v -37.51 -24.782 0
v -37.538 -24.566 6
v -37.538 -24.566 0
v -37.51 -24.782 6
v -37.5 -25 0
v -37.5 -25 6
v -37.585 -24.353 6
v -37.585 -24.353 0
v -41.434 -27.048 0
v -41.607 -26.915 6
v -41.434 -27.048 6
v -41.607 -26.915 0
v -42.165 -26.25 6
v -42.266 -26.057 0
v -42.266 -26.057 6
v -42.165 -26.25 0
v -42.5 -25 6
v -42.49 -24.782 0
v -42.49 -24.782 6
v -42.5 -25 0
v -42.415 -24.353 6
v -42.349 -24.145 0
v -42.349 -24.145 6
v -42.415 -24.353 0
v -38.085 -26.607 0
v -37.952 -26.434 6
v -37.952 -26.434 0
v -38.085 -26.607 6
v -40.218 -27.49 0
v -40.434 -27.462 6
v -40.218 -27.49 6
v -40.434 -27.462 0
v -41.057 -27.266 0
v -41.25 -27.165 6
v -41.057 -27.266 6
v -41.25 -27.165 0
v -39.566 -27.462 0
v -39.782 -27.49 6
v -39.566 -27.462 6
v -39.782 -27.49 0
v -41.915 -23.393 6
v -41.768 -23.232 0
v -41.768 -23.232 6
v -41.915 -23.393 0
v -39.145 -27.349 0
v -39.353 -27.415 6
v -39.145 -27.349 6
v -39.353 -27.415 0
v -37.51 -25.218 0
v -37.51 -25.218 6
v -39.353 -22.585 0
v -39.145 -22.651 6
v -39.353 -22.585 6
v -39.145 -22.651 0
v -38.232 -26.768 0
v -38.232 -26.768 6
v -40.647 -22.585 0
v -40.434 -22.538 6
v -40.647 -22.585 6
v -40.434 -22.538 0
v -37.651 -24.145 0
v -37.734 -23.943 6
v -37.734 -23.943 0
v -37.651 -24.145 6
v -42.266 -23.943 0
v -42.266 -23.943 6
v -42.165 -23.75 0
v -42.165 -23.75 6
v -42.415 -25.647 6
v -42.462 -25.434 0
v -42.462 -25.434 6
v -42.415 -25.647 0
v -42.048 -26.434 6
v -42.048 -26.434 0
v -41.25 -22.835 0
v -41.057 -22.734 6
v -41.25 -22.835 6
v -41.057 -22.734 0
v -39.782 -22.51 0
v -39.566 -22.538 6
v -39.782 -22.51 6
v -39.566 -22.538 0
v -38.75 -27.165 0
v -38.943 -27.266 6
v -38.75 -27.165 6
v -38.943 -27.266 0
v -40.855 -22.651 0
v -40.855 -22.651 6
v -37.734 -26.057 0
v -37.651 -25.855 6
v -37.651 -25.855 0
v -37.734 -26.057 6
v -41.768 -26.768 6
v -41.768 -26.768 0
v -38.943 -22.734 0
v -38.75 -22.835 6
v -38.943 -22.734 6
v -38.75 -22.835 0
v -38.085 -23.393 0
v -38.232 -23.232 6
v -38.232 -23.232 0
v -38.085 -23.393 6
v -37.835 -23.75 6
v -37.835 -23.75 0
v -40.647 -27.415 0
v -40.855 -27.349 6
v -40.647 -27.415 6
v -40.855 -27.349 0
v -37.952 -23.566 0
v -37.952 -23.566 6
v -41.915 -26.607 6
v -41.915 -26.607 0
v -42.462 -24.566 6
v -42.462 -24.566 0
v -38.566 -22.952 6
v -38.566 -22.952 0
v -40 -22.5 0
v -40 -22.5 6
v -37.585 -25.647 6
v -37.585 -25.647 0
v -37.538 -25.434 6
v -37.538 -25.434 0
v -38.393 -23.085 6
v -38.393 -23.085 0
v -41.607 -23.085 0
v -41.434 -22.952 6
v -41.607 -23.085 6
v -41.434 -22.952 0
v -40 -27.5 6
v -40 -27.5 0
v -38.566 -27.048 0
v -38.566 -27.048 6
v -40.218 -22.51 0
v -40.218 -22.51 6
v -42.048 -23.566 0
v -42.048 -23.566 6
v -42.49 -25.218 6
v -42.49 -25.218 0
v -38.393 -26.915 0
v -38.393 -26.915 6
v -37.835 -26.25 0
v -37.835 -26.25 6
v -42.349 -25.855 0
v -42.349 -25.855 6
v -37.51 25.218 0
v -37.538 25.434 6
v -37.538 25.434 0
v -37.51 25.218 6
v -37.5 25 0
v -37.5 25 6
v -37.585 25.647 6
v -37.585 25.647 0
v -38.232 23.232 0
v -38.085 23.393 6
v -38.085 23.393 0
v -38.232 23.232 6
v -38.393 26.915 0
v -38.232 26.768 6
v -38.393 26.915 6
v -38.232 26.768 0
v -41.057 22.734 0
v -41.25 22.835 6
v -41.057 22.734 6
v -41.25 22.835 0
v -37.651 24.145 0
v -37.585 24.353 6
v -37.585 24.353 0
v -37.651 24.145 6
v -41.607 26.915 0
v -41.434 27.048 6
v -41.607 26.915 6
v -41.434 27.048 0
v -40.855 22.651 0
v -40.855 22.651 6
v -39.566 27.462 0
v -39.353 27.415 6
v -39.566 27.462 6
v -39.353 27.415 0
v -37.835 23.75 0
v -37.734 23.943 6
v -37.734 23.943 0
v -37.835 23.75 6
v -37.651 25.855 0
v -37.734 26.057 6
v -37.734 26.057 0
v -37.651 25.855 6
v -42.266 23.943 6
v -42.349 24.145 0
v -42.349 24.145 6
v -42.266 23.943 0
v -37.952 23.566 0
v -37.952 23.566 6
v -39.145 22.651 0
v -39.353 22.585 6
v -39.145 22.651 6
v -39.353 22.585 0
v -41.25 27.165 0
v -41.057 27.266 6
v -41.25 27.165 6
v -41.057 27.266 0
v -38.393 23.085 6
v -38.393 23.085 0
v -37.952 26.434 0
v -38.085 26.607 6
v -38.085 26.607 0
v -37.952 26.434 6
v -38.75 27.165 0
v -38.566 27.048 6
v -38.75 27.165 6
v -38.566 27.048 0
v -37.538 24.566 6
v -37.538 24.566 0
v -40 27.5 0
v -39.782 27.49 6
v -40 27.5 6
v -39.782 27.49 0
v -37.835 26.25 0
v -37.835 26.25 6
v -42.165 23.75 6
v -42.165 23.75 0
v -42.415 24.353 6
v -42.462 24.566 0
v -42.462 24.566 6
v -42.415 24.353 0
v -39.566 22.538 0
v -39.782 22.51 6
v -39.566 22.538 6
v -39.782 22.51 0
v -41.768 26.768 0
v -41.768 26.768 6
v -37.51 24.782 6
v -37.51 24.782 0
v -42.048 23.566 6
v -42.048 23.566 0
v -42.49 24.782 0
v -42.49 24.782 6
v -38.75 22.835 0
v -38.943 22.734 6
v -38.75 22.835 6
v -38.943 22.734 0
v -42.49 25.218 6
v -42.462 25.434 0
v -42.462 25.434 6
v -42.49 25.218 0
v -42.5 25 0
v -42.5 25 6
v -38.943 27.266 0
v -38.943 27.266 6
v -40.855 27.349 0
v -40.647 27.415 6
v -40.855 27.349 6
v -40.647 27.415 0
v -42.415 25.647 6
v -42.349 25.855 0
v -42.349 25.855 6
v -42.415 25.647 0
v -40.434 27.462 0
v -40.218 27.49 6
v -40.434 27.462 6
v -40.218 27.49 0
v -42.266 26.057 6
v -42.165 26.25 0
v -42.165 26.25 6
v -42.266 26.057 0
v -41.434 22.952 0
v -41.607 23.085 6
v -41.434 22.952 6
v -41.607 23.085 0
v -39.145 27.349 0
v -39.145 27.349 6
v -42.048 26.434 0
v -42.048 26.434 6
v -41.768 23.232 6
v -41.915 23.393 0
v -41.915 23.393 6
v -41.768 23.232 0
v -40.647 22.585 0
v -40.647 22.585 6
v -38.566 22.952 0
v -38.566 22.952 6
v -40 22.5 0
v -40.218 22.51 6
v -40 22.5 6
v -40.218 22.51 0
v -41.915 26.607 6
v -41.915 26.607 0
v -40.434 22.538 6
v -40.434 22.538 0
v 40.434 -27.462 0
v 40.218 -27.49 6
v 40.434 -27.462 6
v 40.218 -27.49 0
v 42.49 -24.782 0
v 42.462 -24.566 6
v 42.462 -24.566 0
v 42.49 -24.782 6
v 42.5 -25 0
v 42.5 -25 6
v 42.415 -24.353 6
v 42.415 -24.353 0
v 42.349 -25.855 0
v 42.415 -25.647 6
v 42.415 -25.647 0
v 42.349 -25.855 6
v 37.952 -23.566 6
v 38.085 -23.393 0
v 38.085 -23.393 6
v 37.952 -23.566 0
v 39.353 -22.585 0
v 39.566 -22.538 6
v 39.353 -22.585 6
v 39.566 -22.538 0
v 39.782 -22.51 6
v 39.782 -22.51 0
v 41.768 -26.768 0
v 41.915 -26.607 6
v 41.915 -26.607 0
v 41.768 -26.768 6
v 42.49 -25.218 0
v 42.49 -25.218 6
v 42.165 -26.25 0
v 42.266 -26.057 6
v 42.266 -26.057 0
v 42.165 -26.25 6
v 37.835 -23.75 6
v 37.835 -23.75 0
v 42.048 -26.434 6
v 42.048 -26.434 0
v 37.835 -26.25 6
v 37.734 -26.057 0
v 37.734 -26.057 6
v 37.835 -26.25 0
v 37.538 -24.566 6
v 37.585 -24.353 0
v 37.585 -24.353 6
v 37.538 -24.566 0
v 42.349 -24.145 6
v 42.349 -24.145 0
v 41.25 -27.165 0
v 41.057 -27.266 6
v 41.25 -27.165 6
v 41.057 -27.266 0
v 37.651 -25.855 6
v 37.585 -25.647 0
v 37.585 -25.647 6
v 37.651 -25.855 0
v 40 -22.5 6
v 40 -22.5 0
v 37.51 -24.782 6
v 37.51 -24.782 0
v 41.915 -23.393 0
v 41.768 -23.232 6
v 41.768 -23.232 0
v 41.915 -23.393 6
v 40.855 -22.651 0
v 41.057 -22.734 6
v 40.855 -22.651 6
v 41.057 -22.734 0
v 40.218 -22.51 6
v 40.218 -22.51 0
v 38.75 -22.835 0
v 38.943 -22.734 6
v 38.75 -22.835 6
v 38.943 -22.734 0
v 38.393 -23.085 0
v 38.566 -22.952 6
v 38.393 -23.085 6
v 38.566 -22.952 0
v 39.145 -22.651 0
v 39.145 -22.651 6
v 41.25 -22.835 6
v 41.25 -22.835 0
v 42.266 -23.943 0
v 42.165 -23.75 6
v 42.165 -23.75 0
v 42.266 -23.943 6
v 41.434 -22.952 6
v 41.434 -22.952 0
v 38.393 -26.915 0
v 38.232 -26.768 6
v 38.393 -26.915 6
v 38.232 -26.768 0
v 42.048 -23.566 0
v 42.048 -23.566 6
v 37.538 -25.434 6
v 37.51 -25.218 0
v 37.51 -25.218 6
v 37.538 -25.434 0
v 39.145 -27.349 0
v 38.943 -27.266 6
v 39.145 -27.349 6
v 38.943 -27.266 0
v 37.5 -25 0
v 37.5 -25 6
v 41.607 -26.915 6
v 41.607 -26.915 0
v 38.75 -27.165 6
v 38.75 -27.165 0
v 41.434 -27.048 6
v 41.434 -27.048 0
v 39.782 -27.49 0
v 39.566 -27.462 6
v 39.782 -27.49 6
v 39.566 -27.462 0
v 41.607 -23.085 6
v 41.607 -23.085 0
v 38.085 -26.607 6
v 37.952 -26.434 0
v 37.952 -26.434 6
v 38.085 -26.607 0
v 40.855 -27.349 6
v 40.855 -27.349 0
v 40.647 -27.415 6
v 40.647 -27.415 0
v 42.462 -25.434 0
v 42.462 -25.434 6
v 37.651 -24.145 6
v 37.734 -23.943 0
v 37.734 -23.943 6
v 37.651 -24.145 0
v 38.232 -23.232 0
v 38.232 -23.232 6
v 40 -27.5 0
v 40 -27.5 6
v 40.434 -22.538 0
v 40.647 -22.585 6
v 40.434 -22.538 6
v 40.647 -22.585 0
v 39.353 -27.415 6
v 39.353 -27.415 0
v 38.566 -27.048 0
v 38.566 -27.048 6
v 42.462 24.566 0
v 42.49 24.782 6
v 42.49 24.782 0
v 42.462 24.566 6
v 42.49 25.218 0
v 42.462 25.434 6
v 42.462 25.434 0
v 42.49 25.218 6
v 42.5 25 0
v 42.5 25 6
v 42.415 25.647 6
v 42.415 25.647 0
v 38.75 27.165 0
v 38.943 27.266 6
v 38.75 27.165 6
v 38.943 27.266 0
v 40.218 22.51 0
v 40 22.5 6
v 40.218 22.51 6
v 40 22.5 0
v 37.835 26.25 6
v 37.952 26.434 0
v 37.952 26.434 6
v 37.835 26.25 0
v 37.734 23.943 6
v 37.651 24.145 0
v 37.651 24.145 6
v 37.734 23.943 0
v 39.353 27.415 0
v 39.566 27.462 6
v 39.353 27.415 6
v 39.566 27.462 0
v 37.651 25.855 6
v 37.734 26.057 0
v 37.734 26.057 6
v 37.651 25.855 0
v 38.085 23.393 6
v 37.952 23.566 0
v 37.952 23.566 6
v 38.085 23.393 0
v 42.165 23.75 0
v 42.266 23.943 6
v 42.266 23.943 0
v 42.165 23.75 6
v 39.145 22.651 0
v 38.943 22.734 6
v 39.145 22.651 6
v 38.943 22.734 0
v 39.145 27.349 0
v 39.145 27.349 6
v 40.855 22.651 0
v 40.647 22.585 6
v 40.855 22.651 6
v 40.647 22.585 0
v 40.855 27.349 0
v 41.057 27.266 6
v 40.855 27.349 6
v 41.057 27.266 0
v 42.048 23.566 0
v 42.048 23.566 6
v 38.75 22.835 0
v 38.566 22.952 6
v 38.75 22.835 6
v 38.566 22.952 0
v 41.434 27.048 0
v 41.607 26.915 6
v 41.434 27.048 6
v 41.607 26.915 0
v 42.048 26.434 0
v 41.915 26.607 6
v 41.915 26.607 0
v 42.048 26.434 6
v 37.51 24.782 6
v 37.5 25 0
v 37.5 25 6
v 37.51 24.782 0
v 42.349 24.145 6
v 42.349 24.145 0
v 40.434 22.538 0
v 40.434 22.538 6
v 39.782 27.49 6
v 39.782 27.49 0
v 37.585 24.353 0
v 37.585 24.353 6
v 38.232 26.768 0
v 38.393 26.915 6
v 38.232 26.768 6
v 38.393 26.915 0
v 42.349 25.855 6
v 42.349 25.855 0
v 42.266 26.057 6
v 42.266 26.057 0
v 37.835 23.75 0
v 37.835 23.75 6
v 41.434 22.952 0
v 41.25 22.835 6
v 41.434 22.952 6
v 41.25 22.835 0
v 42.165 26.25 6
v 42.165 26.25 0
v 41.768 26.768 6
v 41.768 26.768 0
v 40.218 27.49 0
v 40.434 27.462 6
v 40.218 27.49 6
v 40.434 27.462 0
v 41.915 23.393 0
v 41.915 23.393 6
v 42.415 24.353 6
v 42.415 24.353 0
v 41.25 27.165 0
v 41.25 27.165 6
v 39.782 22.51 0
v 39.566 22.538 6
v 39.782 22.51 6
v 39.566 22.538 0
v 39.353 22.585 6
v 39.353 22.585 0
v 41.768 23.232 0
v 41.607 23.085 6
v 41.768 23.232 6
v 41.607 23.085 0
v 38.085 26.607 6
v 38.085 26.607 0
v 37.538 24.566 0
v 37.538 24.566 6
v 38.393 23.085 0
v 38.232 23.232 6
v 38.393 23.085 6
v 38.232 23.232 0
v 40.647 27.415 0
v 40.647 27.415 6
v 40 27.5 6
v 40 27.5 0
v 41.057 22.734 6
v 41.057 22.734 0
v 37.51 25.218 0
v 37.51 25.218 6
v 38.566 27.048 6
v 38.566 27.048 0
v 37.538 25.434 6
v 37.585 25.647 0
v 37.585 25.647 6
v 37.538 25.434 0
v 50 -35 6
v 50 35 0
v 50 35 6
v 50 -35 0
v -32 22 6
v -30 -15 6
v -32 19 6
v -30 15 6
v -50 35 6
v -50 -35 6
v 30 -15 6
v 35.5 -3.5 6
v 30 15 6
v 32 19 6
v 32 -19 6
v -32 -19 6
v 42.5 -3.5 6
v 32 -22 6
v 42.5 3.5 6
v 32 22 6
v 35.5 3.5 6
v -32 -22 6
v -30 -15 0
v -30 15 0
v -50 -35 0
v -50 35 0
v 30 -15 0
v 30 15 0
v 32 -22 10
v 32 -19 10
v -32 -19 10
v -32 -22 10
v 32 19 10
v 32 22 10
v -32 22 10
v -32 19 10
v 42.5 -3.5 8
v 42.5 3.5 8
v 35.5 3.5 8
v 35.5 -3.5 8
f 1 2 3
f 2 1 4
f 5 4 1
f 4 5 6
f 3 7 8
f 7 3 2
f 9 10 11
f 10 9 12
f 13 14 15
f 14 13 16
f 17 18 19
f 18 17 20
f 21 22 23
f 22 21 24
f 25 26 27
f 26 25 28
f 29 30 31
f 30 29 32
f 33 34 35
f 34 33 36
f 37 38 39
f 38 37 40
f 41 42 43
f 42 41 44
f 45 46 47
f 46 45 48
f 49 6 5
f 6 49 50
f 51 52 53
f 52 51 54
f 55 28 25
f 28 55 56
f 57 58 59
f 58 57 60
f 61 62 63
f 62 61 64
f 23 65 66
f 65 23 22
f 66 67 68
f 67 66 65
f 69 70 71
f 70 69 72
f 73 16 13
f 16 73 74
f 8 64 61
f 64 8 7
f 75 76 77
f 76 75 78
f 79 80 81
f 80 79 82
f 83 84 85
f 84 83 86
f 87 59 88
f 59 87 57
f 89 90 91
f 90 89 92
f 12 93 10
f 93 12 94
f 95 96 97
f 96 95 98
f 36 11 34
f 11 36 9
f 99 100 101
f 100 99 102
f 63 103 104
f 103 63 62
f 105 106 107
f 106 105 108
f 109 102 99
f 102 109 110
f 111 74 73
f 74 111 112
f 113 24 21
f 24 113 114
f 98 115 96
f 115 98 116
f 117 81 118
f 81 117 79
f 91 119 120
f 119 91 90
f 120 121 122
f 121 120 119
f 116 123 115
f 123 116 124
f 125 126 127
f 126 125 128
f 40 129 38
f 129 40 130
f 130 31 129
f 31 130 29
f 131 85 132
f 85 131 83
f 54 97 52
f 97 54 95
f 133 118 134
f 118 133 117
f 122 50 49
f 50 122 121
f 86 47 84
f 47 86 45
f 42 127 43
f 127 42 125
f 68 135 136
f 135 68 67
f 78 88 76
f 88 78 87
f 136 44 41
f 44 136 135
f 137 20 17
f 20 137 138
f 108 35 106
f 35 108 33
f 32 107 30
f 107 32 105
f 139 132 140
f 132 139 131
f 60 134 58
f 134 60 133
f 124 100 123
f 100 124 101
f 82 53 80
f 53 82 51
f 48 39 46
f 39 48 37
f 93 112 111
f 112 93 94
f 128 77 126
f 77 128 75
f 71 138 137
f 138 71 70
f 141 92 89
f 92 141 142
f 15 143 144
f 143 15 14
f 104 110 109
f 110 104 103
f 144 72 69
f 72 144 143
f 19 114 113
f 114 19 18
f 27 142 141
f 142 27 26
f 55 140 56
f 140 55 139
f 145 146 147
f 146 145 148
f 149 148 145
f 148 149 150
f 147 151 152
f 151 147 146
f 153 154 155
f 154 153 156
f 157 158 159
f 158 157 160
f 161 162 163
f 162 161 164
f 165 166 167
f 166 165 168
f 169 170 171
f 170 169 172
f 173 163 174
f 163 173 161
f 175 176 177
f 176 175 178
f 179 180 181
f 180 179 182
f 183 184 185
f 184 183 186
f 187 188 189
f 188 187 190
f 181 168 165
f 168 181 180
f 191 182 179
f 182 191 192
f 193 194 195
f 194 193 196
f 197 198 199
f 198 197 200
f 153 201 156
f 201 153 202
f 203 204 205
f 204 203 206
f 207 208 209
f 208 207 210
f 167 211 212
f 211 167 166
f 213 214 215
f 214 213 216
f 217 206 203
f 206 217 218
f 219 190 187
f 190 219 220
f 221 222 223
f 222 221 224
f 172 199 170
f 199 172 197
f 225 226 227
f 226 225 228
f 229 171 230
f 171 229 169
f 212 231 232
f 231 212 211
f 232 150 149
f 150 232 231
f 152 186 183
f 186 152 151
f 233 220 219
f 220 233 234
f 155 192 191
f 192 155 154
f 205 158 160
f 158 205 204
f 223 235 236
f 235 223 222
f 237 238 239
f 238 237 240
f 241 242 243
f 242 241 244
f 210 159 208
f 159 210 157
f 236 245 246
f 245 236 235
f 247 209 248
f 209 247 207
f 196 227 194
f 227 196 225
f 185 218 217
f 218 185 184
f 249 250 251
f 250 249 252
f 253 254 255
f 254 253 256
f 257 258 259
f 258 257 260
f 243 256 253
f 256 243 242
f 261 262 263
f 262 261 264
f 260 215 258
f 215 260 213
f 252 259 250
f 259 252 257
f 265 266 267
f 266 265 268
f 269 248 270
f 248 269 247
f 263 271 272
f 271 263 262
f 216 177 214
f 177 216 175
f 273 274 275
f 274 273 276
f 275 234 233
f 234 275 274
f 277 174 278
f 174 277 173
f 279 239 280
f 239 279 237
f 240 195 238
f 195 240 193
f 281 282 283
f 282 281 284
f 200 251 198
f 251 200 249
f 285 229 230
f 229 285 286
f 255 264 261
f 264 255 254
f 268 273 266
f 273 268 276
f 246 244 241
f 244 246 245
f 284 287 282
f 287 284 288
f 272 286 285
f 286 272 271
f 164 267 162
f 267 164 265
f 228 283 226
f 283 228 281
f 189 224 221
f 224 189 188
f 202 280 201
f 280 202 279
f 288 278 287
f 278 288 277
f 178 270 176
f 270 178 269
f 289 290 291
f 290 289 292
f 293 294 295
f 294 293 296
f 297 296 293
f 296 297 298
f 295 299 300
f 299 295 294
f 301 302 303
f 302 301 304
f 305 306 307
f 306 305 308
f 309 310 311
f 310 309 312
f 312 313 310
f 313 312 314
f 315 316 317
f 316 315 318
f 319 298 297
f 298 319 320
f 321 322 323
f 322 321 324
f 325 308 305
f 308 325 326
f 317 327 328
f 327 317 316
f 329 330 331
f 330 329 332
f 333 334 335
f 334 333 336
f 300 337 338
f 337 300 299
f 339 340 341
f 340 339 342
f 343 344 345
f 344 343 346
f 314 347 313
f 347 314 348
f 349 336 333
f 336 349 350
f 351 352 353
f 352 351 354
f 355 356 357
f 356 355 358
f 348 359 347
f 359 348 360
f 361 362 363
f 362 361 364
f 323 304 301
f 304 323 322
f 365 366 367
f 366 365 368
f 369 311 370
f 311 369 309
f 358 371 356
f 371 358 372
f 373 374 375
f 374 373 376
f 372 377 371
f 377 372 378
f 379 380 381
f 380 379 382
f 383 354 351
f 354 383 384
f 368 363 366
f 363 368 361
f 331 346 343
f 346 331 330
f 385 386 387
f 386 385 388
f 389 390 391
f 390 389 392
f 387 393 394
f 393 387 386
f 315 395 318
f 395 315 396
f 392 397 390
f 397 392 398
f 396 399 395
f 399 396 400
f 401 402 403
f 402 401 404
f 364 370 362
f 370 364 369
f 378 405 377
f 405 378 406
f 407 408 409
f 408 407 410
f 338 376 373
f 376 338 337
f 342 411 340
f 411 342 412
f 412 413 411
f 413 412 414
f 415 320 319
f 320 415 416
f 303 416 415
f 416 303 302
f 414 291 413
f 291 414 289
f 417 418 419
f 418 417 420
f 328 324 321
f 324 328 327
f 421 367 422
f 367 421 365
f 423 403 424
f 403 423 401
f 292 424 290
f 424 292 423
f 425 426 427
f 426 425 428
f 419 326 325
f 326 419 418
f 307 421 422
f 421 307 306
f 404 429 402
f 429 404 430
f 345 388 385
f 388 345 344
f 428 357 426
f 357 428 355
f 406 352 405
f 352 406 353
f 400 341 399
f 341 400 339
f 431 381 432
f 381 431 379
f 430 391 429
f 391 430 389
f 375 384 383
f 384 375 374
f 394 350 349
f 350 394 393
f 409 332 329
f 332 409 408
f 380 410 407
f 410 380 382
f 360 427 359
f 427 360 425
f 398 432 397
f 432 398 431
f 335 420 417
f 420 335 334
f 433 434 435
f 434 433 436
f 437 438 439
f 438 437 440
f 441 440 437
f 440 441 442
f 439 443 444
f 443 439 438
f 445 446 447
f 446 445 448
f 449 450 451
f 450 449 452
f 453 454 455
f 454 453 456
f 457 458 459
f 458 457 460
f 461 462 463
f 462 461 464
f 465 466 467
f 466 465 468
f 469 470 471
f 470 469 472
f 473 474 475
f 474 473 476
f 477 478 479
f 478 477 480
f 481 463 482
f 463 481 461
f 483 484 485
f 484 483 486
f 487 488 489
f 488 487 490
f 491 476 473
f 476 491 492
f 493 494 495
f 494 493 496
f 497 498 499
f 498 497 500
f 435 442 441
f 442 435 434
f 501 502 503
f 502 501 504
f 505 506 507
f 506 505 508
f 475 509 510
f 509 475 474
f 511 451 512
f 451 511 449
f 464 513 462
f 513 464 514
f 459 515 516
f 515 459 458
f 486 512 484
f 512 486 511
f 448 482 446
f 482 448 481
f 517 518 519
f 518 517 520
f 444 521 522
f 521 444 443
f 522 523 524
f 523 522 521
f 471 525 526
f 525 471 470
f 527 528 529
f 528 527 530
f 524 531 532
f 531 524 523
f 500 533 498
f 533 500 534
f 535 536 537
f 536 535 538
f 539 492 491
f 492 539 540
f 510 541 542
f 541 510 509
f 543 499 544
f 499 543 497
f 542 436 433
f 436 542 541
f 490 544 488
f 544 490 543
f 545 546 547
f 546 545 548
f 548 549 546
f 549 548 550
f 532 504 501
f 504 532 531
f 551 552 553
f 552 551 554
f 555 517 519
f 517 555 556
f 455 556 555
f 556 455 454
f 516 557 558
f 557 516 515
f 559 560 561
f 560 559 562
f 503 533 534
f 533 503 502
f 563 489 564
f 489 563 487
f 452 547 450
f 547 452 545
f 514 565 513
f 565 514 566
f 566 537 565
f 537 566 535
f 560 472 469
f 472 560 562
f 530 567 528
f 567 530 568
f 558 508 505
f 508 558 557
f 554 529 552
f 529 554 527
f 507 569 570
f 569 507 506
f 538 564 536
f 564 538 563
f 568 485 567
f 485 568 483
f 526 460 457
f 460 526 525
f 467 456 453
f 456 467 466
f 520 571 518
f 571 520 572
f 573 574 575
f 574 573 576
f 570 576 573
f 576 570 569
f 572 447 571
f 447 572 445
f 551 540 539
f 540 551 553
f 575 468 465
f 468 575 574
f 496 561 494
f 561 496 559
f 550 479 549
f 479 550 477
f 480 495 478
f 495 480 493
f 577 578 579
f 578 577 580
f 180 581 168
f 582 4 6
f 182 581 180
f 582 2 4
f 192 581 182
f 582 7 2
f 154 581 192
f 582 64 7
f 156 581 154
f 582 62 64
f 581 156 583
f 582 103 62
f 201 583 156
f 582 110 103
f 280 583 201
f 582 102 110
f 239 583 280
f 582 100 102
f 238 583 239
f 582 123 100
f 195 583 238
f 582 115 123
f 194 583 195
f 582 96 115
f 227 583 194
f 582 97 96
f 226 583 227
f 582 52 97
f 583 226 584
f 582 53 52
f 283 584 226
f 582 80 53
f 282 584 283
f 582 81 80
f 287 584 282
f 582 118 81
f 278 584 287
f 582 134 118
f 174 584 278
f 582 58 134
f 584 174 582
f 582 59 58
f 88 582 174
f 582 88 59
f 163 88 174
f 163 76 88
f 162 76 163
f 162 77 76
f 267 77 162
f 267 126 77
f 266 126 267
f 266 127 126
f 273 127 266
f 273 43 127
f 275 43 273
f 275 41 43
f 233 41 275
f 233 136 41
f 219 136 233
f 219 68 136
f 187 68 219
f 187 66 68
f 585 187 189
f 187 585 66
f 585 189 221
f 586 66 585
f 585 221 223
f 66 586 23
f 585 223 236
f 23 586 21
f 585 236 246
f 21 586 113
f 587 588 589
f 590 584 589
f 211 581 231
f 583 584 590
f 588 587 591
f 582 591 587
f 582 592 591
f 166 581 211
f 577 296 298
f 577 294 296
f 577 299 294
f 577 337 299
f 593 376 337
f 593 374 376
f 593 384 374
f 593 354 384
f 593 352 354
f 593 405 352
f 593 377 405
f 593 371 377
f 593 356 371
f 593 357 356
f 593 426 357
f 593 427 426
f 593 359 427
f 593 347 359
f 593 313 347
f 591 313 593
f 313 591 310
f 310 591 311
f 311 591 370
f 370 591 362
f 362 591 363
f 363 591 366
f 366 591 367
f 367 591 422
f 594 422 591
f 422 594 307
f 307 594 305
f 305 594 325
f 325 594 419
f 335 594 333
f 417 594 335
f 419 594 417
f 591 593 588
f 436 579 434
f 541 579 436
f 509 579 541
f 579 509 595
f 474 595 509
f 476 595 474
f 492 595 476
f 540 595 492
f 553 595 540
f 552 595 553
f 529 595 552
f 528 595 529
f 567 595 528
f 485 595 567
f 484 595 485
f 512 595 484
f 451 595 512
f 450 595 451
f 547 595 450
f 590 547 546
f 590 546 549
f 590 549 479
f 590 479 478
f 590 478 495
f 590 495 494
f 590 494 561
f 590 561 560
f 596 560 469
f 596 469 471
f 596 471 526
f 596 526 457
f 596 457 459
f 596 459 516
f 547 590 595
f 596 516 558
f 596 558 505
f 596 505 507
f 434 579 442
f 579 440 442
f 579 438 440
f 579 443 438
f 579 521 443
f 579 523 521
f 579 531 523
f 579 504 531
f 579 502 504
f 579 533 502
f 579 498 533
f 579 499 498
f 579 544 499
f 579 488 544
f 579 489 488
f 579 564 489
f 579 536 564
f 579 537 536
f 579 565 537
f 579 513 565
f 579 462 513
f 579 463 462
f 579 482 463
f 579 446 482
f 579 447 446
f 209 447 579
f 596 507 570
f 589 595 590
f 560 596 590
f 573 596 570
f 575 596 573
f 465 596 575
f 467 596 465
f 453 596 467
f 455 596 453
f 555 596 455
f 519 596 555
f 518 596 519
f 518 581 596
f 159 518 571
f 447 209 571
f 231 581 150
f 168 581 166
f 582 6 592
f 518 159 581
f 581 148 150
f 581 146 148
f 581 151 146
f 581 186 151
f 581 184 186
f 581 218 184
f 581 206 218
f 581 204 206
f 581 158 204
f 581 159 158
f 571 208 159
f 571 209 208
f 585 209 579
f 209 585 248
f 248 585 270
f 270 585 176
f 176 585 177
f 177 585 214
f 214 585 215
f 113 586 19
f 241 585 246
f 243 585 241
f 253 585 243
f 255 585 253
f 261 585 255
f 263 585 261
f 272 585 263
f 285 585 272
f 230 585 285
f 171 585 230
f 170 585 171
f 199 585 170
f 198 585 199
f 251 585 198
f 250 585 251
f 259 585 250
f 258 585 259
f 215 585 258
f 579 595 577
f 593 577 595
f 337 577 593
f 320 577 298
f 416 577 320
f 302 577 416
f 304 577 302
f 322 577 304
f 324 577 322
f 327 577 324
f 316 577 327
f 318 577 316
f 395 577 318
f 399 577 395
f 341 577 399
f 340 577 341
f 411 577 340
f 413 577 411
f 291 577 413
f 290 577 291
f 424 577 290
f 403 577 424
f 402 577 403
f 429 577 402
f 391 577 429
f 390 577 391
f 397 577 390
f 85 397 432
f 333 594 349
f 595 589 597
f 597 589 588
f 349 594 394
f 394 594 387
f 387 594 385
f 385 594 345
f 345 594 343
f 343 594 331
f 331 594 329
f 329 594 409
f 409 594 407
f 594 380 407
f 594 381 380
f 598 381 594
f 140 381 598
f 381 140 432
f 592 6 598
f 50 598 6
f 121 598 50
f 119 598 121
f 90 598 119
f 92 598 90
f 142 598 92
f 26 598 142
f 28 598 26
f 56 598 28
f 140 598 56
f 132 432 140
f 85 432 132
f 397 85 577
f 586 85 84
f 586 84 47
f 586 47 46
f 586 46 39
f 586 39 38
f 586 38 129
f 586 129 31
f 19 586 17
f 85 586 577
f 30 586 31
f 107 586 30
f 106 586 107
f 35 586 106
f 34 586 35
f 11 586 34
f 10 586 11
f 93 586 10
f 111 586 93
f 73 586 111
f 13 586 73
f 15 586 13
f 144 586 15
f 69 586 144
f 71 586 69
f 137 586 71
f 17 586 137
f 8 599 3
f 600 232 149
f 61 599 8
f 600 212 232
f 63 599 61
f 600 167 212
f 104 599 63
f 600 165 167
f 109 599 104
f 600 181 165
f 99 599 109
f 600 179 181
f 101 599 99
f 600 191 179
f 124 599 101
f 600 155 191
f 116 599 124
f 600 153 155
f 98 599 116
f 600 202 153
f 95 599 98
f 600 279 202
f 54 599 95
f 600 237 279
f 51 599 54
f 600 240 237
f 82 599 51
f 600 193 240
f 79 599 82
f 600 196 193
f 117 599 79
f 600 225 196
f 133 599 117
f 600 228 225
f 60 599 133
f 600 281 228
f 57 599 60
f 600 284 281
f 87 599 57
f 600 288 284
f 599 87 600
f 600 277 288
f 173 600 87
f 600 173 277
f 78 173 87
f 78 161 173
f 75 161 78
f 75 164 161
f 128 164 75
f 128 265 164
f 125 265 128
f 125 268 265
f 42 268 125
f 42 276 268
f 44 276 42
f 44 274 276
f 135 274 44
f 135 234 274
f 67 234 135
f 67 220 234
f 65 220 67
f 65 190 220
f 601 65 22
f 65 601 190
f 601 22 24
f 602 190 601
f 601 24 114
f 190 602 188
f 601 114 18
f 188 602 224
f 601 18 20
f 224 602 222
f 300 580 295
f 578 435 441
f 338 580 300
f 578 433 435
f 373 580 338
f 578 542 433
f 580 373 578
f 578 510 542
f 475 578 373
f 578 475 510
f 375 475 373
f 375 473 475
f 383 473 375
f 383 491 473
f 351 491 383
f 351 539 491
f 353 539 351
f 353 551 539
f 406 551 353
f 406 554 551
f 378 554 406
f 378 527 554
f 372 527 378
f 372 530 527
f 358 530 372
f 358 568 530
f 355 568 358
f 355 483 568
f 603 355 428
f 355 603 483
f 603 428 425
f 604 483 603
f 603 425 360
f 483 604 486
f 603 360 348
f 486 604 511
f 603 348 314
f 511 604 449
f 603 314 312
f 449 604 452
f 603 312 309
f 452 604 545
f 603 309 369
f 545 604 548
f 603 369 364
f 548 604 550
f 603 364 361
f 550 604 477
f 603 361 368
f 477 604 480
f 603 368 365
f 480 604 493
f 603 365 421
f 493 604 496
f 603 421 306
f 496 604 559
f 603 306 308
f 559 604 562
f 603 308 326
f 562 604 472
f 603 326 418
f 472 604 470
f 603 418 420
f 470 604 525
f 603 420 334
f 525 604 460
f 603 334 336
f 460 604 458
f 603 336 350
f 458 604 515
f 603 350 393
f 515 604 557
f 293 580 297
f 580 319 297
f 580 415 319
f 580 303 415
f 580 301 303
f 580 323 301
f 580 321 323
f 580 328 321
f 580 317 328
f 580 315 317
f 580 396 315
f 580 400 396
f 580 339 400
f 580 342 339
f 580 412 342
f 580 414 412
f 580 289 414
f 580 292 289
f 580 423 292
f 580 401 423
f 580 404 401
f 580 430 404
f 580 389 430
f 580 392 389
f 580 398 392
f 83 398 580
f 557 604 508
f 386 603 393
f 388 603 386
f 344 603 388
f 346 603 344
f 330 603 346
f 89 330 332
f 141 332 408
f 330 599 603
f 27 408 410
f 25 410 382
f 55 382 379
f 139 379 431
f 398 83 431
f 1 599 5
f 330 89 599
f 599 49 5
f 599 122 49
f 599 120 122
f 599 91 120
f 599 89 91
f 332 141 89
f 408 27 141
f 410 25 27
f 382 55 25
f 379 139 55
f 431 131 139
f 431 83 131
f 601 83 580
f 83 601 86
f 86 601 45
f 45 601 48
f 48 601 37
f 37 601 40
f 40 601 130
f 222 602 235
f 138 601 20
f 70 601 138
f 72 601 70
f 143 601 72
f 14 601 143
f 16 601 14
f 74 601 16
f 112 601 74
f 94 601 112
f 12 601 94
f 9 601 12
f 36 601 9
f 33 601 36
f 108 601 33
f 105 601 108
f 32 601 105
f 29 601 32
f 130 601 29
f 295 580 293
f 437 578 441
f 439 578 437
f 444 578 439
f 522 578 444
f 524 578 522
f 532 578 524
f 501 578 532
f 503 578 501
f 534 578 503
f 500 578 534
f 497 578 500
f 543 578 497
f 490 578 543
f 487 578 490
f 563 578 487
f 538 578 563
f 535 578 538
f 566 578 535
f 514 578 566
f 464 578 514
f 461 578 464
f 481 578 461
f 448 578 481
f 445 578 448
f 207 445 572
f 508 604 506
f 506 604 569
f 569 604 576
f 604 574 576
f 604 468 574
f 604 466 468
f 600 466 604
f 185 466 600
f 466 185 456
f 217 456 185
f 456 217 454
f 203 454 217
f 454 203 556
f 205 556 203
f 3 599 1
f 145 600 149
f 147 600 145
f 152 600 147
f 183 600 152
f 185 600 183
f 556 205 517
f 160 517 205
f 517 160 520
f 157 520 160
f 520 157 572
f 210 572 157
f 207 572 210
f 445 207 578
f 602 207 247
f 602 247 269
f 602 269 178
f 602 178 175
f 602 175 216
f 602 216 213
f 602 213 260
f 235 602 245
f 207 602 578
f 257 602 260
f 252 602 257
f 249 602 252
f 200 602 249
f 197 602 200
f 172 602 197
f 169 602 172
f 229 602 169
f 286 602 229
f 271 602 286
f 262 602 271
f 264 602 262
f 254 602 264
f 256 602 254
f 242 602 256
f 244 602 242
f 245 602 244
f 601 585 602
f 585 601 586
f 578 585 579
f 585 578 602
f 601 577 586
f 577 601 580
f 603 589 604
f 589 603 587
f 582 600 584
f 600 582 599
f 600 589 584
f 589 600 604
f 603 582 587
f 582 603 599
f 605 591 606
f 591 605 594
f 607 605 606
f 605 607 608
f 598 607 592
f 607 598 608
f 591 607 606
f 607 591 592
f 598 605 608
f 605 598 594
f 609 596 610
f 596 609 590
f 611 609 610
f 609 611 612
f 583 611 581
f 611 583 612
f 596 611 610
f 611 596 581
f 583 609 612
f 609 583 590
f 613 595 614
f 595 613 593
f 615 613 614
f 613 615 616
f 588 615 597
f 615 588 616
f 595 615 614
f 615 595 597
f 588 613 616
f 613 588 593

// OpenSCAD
// Microfluidic chip imaging holder — reference solution
// Category: tools; purpose: repeatable positioning during optical chip imaging
// Print on flat base with z=0 on bed; PLA/PETG, no supports; not certified for clinical or sterile use
// SPDX-License-Identifier: CERN-OHL-P-2.0
$fn=72;
eps=0.05;
base_x=100;
base_y=70;
base_h=6;
window_x=60;
window_y=30;
hole_d=5;
hole_pitch_x=80;
hole_pitch_y=50;
rail_len=64;
rail_width=3;
rail_h=4;
rail_center_y=20.5;
marker_x=7;
marker_y=7;
marker_h=2;
marker_center_x=39;
assert(base_x > window_x + 2*hole_d);
assert(base_y > window_y + 2*hole_d);
assert(hole_pitch_x/2+hole_d/2 < base_x/2);
assert(hole_pitch_y/2+hole_d/2 < base_y/2);
assert(rail_center_y - rail_width/2 > window_y/2);
module reference(){
 union(){
  difference(){
   translate([-base_x/2,-base_y/2,0]) cube([base_x,base_y,base_h]);
   translate([-window_x/2,-window_y/2,-eps]) cube([window_x,window_y,base_h+2*eps]);
   for(x=[-hole_pitch_x/2,hole_pitch_x/2])
    for(y=[-hole_pitch_y/2,hole_pitch_y/2])
     translate([x,y,-eps]) cylinder(d=hole_d,h=base_h+2*eps);
  }
  for(y=[-rail_center_y,rail_center_y])
   translate([-rail_len/2,y-rail_width/2,base_h-eps])
    cube([rail_len,rail_width,rail_h+eps]);
  translate([marker_center_x-marker_x/2,-marker_y/2,base_h-eps])
   cube([marker_x,marker_y,marker_h+eps]);
 }
}
reference();
